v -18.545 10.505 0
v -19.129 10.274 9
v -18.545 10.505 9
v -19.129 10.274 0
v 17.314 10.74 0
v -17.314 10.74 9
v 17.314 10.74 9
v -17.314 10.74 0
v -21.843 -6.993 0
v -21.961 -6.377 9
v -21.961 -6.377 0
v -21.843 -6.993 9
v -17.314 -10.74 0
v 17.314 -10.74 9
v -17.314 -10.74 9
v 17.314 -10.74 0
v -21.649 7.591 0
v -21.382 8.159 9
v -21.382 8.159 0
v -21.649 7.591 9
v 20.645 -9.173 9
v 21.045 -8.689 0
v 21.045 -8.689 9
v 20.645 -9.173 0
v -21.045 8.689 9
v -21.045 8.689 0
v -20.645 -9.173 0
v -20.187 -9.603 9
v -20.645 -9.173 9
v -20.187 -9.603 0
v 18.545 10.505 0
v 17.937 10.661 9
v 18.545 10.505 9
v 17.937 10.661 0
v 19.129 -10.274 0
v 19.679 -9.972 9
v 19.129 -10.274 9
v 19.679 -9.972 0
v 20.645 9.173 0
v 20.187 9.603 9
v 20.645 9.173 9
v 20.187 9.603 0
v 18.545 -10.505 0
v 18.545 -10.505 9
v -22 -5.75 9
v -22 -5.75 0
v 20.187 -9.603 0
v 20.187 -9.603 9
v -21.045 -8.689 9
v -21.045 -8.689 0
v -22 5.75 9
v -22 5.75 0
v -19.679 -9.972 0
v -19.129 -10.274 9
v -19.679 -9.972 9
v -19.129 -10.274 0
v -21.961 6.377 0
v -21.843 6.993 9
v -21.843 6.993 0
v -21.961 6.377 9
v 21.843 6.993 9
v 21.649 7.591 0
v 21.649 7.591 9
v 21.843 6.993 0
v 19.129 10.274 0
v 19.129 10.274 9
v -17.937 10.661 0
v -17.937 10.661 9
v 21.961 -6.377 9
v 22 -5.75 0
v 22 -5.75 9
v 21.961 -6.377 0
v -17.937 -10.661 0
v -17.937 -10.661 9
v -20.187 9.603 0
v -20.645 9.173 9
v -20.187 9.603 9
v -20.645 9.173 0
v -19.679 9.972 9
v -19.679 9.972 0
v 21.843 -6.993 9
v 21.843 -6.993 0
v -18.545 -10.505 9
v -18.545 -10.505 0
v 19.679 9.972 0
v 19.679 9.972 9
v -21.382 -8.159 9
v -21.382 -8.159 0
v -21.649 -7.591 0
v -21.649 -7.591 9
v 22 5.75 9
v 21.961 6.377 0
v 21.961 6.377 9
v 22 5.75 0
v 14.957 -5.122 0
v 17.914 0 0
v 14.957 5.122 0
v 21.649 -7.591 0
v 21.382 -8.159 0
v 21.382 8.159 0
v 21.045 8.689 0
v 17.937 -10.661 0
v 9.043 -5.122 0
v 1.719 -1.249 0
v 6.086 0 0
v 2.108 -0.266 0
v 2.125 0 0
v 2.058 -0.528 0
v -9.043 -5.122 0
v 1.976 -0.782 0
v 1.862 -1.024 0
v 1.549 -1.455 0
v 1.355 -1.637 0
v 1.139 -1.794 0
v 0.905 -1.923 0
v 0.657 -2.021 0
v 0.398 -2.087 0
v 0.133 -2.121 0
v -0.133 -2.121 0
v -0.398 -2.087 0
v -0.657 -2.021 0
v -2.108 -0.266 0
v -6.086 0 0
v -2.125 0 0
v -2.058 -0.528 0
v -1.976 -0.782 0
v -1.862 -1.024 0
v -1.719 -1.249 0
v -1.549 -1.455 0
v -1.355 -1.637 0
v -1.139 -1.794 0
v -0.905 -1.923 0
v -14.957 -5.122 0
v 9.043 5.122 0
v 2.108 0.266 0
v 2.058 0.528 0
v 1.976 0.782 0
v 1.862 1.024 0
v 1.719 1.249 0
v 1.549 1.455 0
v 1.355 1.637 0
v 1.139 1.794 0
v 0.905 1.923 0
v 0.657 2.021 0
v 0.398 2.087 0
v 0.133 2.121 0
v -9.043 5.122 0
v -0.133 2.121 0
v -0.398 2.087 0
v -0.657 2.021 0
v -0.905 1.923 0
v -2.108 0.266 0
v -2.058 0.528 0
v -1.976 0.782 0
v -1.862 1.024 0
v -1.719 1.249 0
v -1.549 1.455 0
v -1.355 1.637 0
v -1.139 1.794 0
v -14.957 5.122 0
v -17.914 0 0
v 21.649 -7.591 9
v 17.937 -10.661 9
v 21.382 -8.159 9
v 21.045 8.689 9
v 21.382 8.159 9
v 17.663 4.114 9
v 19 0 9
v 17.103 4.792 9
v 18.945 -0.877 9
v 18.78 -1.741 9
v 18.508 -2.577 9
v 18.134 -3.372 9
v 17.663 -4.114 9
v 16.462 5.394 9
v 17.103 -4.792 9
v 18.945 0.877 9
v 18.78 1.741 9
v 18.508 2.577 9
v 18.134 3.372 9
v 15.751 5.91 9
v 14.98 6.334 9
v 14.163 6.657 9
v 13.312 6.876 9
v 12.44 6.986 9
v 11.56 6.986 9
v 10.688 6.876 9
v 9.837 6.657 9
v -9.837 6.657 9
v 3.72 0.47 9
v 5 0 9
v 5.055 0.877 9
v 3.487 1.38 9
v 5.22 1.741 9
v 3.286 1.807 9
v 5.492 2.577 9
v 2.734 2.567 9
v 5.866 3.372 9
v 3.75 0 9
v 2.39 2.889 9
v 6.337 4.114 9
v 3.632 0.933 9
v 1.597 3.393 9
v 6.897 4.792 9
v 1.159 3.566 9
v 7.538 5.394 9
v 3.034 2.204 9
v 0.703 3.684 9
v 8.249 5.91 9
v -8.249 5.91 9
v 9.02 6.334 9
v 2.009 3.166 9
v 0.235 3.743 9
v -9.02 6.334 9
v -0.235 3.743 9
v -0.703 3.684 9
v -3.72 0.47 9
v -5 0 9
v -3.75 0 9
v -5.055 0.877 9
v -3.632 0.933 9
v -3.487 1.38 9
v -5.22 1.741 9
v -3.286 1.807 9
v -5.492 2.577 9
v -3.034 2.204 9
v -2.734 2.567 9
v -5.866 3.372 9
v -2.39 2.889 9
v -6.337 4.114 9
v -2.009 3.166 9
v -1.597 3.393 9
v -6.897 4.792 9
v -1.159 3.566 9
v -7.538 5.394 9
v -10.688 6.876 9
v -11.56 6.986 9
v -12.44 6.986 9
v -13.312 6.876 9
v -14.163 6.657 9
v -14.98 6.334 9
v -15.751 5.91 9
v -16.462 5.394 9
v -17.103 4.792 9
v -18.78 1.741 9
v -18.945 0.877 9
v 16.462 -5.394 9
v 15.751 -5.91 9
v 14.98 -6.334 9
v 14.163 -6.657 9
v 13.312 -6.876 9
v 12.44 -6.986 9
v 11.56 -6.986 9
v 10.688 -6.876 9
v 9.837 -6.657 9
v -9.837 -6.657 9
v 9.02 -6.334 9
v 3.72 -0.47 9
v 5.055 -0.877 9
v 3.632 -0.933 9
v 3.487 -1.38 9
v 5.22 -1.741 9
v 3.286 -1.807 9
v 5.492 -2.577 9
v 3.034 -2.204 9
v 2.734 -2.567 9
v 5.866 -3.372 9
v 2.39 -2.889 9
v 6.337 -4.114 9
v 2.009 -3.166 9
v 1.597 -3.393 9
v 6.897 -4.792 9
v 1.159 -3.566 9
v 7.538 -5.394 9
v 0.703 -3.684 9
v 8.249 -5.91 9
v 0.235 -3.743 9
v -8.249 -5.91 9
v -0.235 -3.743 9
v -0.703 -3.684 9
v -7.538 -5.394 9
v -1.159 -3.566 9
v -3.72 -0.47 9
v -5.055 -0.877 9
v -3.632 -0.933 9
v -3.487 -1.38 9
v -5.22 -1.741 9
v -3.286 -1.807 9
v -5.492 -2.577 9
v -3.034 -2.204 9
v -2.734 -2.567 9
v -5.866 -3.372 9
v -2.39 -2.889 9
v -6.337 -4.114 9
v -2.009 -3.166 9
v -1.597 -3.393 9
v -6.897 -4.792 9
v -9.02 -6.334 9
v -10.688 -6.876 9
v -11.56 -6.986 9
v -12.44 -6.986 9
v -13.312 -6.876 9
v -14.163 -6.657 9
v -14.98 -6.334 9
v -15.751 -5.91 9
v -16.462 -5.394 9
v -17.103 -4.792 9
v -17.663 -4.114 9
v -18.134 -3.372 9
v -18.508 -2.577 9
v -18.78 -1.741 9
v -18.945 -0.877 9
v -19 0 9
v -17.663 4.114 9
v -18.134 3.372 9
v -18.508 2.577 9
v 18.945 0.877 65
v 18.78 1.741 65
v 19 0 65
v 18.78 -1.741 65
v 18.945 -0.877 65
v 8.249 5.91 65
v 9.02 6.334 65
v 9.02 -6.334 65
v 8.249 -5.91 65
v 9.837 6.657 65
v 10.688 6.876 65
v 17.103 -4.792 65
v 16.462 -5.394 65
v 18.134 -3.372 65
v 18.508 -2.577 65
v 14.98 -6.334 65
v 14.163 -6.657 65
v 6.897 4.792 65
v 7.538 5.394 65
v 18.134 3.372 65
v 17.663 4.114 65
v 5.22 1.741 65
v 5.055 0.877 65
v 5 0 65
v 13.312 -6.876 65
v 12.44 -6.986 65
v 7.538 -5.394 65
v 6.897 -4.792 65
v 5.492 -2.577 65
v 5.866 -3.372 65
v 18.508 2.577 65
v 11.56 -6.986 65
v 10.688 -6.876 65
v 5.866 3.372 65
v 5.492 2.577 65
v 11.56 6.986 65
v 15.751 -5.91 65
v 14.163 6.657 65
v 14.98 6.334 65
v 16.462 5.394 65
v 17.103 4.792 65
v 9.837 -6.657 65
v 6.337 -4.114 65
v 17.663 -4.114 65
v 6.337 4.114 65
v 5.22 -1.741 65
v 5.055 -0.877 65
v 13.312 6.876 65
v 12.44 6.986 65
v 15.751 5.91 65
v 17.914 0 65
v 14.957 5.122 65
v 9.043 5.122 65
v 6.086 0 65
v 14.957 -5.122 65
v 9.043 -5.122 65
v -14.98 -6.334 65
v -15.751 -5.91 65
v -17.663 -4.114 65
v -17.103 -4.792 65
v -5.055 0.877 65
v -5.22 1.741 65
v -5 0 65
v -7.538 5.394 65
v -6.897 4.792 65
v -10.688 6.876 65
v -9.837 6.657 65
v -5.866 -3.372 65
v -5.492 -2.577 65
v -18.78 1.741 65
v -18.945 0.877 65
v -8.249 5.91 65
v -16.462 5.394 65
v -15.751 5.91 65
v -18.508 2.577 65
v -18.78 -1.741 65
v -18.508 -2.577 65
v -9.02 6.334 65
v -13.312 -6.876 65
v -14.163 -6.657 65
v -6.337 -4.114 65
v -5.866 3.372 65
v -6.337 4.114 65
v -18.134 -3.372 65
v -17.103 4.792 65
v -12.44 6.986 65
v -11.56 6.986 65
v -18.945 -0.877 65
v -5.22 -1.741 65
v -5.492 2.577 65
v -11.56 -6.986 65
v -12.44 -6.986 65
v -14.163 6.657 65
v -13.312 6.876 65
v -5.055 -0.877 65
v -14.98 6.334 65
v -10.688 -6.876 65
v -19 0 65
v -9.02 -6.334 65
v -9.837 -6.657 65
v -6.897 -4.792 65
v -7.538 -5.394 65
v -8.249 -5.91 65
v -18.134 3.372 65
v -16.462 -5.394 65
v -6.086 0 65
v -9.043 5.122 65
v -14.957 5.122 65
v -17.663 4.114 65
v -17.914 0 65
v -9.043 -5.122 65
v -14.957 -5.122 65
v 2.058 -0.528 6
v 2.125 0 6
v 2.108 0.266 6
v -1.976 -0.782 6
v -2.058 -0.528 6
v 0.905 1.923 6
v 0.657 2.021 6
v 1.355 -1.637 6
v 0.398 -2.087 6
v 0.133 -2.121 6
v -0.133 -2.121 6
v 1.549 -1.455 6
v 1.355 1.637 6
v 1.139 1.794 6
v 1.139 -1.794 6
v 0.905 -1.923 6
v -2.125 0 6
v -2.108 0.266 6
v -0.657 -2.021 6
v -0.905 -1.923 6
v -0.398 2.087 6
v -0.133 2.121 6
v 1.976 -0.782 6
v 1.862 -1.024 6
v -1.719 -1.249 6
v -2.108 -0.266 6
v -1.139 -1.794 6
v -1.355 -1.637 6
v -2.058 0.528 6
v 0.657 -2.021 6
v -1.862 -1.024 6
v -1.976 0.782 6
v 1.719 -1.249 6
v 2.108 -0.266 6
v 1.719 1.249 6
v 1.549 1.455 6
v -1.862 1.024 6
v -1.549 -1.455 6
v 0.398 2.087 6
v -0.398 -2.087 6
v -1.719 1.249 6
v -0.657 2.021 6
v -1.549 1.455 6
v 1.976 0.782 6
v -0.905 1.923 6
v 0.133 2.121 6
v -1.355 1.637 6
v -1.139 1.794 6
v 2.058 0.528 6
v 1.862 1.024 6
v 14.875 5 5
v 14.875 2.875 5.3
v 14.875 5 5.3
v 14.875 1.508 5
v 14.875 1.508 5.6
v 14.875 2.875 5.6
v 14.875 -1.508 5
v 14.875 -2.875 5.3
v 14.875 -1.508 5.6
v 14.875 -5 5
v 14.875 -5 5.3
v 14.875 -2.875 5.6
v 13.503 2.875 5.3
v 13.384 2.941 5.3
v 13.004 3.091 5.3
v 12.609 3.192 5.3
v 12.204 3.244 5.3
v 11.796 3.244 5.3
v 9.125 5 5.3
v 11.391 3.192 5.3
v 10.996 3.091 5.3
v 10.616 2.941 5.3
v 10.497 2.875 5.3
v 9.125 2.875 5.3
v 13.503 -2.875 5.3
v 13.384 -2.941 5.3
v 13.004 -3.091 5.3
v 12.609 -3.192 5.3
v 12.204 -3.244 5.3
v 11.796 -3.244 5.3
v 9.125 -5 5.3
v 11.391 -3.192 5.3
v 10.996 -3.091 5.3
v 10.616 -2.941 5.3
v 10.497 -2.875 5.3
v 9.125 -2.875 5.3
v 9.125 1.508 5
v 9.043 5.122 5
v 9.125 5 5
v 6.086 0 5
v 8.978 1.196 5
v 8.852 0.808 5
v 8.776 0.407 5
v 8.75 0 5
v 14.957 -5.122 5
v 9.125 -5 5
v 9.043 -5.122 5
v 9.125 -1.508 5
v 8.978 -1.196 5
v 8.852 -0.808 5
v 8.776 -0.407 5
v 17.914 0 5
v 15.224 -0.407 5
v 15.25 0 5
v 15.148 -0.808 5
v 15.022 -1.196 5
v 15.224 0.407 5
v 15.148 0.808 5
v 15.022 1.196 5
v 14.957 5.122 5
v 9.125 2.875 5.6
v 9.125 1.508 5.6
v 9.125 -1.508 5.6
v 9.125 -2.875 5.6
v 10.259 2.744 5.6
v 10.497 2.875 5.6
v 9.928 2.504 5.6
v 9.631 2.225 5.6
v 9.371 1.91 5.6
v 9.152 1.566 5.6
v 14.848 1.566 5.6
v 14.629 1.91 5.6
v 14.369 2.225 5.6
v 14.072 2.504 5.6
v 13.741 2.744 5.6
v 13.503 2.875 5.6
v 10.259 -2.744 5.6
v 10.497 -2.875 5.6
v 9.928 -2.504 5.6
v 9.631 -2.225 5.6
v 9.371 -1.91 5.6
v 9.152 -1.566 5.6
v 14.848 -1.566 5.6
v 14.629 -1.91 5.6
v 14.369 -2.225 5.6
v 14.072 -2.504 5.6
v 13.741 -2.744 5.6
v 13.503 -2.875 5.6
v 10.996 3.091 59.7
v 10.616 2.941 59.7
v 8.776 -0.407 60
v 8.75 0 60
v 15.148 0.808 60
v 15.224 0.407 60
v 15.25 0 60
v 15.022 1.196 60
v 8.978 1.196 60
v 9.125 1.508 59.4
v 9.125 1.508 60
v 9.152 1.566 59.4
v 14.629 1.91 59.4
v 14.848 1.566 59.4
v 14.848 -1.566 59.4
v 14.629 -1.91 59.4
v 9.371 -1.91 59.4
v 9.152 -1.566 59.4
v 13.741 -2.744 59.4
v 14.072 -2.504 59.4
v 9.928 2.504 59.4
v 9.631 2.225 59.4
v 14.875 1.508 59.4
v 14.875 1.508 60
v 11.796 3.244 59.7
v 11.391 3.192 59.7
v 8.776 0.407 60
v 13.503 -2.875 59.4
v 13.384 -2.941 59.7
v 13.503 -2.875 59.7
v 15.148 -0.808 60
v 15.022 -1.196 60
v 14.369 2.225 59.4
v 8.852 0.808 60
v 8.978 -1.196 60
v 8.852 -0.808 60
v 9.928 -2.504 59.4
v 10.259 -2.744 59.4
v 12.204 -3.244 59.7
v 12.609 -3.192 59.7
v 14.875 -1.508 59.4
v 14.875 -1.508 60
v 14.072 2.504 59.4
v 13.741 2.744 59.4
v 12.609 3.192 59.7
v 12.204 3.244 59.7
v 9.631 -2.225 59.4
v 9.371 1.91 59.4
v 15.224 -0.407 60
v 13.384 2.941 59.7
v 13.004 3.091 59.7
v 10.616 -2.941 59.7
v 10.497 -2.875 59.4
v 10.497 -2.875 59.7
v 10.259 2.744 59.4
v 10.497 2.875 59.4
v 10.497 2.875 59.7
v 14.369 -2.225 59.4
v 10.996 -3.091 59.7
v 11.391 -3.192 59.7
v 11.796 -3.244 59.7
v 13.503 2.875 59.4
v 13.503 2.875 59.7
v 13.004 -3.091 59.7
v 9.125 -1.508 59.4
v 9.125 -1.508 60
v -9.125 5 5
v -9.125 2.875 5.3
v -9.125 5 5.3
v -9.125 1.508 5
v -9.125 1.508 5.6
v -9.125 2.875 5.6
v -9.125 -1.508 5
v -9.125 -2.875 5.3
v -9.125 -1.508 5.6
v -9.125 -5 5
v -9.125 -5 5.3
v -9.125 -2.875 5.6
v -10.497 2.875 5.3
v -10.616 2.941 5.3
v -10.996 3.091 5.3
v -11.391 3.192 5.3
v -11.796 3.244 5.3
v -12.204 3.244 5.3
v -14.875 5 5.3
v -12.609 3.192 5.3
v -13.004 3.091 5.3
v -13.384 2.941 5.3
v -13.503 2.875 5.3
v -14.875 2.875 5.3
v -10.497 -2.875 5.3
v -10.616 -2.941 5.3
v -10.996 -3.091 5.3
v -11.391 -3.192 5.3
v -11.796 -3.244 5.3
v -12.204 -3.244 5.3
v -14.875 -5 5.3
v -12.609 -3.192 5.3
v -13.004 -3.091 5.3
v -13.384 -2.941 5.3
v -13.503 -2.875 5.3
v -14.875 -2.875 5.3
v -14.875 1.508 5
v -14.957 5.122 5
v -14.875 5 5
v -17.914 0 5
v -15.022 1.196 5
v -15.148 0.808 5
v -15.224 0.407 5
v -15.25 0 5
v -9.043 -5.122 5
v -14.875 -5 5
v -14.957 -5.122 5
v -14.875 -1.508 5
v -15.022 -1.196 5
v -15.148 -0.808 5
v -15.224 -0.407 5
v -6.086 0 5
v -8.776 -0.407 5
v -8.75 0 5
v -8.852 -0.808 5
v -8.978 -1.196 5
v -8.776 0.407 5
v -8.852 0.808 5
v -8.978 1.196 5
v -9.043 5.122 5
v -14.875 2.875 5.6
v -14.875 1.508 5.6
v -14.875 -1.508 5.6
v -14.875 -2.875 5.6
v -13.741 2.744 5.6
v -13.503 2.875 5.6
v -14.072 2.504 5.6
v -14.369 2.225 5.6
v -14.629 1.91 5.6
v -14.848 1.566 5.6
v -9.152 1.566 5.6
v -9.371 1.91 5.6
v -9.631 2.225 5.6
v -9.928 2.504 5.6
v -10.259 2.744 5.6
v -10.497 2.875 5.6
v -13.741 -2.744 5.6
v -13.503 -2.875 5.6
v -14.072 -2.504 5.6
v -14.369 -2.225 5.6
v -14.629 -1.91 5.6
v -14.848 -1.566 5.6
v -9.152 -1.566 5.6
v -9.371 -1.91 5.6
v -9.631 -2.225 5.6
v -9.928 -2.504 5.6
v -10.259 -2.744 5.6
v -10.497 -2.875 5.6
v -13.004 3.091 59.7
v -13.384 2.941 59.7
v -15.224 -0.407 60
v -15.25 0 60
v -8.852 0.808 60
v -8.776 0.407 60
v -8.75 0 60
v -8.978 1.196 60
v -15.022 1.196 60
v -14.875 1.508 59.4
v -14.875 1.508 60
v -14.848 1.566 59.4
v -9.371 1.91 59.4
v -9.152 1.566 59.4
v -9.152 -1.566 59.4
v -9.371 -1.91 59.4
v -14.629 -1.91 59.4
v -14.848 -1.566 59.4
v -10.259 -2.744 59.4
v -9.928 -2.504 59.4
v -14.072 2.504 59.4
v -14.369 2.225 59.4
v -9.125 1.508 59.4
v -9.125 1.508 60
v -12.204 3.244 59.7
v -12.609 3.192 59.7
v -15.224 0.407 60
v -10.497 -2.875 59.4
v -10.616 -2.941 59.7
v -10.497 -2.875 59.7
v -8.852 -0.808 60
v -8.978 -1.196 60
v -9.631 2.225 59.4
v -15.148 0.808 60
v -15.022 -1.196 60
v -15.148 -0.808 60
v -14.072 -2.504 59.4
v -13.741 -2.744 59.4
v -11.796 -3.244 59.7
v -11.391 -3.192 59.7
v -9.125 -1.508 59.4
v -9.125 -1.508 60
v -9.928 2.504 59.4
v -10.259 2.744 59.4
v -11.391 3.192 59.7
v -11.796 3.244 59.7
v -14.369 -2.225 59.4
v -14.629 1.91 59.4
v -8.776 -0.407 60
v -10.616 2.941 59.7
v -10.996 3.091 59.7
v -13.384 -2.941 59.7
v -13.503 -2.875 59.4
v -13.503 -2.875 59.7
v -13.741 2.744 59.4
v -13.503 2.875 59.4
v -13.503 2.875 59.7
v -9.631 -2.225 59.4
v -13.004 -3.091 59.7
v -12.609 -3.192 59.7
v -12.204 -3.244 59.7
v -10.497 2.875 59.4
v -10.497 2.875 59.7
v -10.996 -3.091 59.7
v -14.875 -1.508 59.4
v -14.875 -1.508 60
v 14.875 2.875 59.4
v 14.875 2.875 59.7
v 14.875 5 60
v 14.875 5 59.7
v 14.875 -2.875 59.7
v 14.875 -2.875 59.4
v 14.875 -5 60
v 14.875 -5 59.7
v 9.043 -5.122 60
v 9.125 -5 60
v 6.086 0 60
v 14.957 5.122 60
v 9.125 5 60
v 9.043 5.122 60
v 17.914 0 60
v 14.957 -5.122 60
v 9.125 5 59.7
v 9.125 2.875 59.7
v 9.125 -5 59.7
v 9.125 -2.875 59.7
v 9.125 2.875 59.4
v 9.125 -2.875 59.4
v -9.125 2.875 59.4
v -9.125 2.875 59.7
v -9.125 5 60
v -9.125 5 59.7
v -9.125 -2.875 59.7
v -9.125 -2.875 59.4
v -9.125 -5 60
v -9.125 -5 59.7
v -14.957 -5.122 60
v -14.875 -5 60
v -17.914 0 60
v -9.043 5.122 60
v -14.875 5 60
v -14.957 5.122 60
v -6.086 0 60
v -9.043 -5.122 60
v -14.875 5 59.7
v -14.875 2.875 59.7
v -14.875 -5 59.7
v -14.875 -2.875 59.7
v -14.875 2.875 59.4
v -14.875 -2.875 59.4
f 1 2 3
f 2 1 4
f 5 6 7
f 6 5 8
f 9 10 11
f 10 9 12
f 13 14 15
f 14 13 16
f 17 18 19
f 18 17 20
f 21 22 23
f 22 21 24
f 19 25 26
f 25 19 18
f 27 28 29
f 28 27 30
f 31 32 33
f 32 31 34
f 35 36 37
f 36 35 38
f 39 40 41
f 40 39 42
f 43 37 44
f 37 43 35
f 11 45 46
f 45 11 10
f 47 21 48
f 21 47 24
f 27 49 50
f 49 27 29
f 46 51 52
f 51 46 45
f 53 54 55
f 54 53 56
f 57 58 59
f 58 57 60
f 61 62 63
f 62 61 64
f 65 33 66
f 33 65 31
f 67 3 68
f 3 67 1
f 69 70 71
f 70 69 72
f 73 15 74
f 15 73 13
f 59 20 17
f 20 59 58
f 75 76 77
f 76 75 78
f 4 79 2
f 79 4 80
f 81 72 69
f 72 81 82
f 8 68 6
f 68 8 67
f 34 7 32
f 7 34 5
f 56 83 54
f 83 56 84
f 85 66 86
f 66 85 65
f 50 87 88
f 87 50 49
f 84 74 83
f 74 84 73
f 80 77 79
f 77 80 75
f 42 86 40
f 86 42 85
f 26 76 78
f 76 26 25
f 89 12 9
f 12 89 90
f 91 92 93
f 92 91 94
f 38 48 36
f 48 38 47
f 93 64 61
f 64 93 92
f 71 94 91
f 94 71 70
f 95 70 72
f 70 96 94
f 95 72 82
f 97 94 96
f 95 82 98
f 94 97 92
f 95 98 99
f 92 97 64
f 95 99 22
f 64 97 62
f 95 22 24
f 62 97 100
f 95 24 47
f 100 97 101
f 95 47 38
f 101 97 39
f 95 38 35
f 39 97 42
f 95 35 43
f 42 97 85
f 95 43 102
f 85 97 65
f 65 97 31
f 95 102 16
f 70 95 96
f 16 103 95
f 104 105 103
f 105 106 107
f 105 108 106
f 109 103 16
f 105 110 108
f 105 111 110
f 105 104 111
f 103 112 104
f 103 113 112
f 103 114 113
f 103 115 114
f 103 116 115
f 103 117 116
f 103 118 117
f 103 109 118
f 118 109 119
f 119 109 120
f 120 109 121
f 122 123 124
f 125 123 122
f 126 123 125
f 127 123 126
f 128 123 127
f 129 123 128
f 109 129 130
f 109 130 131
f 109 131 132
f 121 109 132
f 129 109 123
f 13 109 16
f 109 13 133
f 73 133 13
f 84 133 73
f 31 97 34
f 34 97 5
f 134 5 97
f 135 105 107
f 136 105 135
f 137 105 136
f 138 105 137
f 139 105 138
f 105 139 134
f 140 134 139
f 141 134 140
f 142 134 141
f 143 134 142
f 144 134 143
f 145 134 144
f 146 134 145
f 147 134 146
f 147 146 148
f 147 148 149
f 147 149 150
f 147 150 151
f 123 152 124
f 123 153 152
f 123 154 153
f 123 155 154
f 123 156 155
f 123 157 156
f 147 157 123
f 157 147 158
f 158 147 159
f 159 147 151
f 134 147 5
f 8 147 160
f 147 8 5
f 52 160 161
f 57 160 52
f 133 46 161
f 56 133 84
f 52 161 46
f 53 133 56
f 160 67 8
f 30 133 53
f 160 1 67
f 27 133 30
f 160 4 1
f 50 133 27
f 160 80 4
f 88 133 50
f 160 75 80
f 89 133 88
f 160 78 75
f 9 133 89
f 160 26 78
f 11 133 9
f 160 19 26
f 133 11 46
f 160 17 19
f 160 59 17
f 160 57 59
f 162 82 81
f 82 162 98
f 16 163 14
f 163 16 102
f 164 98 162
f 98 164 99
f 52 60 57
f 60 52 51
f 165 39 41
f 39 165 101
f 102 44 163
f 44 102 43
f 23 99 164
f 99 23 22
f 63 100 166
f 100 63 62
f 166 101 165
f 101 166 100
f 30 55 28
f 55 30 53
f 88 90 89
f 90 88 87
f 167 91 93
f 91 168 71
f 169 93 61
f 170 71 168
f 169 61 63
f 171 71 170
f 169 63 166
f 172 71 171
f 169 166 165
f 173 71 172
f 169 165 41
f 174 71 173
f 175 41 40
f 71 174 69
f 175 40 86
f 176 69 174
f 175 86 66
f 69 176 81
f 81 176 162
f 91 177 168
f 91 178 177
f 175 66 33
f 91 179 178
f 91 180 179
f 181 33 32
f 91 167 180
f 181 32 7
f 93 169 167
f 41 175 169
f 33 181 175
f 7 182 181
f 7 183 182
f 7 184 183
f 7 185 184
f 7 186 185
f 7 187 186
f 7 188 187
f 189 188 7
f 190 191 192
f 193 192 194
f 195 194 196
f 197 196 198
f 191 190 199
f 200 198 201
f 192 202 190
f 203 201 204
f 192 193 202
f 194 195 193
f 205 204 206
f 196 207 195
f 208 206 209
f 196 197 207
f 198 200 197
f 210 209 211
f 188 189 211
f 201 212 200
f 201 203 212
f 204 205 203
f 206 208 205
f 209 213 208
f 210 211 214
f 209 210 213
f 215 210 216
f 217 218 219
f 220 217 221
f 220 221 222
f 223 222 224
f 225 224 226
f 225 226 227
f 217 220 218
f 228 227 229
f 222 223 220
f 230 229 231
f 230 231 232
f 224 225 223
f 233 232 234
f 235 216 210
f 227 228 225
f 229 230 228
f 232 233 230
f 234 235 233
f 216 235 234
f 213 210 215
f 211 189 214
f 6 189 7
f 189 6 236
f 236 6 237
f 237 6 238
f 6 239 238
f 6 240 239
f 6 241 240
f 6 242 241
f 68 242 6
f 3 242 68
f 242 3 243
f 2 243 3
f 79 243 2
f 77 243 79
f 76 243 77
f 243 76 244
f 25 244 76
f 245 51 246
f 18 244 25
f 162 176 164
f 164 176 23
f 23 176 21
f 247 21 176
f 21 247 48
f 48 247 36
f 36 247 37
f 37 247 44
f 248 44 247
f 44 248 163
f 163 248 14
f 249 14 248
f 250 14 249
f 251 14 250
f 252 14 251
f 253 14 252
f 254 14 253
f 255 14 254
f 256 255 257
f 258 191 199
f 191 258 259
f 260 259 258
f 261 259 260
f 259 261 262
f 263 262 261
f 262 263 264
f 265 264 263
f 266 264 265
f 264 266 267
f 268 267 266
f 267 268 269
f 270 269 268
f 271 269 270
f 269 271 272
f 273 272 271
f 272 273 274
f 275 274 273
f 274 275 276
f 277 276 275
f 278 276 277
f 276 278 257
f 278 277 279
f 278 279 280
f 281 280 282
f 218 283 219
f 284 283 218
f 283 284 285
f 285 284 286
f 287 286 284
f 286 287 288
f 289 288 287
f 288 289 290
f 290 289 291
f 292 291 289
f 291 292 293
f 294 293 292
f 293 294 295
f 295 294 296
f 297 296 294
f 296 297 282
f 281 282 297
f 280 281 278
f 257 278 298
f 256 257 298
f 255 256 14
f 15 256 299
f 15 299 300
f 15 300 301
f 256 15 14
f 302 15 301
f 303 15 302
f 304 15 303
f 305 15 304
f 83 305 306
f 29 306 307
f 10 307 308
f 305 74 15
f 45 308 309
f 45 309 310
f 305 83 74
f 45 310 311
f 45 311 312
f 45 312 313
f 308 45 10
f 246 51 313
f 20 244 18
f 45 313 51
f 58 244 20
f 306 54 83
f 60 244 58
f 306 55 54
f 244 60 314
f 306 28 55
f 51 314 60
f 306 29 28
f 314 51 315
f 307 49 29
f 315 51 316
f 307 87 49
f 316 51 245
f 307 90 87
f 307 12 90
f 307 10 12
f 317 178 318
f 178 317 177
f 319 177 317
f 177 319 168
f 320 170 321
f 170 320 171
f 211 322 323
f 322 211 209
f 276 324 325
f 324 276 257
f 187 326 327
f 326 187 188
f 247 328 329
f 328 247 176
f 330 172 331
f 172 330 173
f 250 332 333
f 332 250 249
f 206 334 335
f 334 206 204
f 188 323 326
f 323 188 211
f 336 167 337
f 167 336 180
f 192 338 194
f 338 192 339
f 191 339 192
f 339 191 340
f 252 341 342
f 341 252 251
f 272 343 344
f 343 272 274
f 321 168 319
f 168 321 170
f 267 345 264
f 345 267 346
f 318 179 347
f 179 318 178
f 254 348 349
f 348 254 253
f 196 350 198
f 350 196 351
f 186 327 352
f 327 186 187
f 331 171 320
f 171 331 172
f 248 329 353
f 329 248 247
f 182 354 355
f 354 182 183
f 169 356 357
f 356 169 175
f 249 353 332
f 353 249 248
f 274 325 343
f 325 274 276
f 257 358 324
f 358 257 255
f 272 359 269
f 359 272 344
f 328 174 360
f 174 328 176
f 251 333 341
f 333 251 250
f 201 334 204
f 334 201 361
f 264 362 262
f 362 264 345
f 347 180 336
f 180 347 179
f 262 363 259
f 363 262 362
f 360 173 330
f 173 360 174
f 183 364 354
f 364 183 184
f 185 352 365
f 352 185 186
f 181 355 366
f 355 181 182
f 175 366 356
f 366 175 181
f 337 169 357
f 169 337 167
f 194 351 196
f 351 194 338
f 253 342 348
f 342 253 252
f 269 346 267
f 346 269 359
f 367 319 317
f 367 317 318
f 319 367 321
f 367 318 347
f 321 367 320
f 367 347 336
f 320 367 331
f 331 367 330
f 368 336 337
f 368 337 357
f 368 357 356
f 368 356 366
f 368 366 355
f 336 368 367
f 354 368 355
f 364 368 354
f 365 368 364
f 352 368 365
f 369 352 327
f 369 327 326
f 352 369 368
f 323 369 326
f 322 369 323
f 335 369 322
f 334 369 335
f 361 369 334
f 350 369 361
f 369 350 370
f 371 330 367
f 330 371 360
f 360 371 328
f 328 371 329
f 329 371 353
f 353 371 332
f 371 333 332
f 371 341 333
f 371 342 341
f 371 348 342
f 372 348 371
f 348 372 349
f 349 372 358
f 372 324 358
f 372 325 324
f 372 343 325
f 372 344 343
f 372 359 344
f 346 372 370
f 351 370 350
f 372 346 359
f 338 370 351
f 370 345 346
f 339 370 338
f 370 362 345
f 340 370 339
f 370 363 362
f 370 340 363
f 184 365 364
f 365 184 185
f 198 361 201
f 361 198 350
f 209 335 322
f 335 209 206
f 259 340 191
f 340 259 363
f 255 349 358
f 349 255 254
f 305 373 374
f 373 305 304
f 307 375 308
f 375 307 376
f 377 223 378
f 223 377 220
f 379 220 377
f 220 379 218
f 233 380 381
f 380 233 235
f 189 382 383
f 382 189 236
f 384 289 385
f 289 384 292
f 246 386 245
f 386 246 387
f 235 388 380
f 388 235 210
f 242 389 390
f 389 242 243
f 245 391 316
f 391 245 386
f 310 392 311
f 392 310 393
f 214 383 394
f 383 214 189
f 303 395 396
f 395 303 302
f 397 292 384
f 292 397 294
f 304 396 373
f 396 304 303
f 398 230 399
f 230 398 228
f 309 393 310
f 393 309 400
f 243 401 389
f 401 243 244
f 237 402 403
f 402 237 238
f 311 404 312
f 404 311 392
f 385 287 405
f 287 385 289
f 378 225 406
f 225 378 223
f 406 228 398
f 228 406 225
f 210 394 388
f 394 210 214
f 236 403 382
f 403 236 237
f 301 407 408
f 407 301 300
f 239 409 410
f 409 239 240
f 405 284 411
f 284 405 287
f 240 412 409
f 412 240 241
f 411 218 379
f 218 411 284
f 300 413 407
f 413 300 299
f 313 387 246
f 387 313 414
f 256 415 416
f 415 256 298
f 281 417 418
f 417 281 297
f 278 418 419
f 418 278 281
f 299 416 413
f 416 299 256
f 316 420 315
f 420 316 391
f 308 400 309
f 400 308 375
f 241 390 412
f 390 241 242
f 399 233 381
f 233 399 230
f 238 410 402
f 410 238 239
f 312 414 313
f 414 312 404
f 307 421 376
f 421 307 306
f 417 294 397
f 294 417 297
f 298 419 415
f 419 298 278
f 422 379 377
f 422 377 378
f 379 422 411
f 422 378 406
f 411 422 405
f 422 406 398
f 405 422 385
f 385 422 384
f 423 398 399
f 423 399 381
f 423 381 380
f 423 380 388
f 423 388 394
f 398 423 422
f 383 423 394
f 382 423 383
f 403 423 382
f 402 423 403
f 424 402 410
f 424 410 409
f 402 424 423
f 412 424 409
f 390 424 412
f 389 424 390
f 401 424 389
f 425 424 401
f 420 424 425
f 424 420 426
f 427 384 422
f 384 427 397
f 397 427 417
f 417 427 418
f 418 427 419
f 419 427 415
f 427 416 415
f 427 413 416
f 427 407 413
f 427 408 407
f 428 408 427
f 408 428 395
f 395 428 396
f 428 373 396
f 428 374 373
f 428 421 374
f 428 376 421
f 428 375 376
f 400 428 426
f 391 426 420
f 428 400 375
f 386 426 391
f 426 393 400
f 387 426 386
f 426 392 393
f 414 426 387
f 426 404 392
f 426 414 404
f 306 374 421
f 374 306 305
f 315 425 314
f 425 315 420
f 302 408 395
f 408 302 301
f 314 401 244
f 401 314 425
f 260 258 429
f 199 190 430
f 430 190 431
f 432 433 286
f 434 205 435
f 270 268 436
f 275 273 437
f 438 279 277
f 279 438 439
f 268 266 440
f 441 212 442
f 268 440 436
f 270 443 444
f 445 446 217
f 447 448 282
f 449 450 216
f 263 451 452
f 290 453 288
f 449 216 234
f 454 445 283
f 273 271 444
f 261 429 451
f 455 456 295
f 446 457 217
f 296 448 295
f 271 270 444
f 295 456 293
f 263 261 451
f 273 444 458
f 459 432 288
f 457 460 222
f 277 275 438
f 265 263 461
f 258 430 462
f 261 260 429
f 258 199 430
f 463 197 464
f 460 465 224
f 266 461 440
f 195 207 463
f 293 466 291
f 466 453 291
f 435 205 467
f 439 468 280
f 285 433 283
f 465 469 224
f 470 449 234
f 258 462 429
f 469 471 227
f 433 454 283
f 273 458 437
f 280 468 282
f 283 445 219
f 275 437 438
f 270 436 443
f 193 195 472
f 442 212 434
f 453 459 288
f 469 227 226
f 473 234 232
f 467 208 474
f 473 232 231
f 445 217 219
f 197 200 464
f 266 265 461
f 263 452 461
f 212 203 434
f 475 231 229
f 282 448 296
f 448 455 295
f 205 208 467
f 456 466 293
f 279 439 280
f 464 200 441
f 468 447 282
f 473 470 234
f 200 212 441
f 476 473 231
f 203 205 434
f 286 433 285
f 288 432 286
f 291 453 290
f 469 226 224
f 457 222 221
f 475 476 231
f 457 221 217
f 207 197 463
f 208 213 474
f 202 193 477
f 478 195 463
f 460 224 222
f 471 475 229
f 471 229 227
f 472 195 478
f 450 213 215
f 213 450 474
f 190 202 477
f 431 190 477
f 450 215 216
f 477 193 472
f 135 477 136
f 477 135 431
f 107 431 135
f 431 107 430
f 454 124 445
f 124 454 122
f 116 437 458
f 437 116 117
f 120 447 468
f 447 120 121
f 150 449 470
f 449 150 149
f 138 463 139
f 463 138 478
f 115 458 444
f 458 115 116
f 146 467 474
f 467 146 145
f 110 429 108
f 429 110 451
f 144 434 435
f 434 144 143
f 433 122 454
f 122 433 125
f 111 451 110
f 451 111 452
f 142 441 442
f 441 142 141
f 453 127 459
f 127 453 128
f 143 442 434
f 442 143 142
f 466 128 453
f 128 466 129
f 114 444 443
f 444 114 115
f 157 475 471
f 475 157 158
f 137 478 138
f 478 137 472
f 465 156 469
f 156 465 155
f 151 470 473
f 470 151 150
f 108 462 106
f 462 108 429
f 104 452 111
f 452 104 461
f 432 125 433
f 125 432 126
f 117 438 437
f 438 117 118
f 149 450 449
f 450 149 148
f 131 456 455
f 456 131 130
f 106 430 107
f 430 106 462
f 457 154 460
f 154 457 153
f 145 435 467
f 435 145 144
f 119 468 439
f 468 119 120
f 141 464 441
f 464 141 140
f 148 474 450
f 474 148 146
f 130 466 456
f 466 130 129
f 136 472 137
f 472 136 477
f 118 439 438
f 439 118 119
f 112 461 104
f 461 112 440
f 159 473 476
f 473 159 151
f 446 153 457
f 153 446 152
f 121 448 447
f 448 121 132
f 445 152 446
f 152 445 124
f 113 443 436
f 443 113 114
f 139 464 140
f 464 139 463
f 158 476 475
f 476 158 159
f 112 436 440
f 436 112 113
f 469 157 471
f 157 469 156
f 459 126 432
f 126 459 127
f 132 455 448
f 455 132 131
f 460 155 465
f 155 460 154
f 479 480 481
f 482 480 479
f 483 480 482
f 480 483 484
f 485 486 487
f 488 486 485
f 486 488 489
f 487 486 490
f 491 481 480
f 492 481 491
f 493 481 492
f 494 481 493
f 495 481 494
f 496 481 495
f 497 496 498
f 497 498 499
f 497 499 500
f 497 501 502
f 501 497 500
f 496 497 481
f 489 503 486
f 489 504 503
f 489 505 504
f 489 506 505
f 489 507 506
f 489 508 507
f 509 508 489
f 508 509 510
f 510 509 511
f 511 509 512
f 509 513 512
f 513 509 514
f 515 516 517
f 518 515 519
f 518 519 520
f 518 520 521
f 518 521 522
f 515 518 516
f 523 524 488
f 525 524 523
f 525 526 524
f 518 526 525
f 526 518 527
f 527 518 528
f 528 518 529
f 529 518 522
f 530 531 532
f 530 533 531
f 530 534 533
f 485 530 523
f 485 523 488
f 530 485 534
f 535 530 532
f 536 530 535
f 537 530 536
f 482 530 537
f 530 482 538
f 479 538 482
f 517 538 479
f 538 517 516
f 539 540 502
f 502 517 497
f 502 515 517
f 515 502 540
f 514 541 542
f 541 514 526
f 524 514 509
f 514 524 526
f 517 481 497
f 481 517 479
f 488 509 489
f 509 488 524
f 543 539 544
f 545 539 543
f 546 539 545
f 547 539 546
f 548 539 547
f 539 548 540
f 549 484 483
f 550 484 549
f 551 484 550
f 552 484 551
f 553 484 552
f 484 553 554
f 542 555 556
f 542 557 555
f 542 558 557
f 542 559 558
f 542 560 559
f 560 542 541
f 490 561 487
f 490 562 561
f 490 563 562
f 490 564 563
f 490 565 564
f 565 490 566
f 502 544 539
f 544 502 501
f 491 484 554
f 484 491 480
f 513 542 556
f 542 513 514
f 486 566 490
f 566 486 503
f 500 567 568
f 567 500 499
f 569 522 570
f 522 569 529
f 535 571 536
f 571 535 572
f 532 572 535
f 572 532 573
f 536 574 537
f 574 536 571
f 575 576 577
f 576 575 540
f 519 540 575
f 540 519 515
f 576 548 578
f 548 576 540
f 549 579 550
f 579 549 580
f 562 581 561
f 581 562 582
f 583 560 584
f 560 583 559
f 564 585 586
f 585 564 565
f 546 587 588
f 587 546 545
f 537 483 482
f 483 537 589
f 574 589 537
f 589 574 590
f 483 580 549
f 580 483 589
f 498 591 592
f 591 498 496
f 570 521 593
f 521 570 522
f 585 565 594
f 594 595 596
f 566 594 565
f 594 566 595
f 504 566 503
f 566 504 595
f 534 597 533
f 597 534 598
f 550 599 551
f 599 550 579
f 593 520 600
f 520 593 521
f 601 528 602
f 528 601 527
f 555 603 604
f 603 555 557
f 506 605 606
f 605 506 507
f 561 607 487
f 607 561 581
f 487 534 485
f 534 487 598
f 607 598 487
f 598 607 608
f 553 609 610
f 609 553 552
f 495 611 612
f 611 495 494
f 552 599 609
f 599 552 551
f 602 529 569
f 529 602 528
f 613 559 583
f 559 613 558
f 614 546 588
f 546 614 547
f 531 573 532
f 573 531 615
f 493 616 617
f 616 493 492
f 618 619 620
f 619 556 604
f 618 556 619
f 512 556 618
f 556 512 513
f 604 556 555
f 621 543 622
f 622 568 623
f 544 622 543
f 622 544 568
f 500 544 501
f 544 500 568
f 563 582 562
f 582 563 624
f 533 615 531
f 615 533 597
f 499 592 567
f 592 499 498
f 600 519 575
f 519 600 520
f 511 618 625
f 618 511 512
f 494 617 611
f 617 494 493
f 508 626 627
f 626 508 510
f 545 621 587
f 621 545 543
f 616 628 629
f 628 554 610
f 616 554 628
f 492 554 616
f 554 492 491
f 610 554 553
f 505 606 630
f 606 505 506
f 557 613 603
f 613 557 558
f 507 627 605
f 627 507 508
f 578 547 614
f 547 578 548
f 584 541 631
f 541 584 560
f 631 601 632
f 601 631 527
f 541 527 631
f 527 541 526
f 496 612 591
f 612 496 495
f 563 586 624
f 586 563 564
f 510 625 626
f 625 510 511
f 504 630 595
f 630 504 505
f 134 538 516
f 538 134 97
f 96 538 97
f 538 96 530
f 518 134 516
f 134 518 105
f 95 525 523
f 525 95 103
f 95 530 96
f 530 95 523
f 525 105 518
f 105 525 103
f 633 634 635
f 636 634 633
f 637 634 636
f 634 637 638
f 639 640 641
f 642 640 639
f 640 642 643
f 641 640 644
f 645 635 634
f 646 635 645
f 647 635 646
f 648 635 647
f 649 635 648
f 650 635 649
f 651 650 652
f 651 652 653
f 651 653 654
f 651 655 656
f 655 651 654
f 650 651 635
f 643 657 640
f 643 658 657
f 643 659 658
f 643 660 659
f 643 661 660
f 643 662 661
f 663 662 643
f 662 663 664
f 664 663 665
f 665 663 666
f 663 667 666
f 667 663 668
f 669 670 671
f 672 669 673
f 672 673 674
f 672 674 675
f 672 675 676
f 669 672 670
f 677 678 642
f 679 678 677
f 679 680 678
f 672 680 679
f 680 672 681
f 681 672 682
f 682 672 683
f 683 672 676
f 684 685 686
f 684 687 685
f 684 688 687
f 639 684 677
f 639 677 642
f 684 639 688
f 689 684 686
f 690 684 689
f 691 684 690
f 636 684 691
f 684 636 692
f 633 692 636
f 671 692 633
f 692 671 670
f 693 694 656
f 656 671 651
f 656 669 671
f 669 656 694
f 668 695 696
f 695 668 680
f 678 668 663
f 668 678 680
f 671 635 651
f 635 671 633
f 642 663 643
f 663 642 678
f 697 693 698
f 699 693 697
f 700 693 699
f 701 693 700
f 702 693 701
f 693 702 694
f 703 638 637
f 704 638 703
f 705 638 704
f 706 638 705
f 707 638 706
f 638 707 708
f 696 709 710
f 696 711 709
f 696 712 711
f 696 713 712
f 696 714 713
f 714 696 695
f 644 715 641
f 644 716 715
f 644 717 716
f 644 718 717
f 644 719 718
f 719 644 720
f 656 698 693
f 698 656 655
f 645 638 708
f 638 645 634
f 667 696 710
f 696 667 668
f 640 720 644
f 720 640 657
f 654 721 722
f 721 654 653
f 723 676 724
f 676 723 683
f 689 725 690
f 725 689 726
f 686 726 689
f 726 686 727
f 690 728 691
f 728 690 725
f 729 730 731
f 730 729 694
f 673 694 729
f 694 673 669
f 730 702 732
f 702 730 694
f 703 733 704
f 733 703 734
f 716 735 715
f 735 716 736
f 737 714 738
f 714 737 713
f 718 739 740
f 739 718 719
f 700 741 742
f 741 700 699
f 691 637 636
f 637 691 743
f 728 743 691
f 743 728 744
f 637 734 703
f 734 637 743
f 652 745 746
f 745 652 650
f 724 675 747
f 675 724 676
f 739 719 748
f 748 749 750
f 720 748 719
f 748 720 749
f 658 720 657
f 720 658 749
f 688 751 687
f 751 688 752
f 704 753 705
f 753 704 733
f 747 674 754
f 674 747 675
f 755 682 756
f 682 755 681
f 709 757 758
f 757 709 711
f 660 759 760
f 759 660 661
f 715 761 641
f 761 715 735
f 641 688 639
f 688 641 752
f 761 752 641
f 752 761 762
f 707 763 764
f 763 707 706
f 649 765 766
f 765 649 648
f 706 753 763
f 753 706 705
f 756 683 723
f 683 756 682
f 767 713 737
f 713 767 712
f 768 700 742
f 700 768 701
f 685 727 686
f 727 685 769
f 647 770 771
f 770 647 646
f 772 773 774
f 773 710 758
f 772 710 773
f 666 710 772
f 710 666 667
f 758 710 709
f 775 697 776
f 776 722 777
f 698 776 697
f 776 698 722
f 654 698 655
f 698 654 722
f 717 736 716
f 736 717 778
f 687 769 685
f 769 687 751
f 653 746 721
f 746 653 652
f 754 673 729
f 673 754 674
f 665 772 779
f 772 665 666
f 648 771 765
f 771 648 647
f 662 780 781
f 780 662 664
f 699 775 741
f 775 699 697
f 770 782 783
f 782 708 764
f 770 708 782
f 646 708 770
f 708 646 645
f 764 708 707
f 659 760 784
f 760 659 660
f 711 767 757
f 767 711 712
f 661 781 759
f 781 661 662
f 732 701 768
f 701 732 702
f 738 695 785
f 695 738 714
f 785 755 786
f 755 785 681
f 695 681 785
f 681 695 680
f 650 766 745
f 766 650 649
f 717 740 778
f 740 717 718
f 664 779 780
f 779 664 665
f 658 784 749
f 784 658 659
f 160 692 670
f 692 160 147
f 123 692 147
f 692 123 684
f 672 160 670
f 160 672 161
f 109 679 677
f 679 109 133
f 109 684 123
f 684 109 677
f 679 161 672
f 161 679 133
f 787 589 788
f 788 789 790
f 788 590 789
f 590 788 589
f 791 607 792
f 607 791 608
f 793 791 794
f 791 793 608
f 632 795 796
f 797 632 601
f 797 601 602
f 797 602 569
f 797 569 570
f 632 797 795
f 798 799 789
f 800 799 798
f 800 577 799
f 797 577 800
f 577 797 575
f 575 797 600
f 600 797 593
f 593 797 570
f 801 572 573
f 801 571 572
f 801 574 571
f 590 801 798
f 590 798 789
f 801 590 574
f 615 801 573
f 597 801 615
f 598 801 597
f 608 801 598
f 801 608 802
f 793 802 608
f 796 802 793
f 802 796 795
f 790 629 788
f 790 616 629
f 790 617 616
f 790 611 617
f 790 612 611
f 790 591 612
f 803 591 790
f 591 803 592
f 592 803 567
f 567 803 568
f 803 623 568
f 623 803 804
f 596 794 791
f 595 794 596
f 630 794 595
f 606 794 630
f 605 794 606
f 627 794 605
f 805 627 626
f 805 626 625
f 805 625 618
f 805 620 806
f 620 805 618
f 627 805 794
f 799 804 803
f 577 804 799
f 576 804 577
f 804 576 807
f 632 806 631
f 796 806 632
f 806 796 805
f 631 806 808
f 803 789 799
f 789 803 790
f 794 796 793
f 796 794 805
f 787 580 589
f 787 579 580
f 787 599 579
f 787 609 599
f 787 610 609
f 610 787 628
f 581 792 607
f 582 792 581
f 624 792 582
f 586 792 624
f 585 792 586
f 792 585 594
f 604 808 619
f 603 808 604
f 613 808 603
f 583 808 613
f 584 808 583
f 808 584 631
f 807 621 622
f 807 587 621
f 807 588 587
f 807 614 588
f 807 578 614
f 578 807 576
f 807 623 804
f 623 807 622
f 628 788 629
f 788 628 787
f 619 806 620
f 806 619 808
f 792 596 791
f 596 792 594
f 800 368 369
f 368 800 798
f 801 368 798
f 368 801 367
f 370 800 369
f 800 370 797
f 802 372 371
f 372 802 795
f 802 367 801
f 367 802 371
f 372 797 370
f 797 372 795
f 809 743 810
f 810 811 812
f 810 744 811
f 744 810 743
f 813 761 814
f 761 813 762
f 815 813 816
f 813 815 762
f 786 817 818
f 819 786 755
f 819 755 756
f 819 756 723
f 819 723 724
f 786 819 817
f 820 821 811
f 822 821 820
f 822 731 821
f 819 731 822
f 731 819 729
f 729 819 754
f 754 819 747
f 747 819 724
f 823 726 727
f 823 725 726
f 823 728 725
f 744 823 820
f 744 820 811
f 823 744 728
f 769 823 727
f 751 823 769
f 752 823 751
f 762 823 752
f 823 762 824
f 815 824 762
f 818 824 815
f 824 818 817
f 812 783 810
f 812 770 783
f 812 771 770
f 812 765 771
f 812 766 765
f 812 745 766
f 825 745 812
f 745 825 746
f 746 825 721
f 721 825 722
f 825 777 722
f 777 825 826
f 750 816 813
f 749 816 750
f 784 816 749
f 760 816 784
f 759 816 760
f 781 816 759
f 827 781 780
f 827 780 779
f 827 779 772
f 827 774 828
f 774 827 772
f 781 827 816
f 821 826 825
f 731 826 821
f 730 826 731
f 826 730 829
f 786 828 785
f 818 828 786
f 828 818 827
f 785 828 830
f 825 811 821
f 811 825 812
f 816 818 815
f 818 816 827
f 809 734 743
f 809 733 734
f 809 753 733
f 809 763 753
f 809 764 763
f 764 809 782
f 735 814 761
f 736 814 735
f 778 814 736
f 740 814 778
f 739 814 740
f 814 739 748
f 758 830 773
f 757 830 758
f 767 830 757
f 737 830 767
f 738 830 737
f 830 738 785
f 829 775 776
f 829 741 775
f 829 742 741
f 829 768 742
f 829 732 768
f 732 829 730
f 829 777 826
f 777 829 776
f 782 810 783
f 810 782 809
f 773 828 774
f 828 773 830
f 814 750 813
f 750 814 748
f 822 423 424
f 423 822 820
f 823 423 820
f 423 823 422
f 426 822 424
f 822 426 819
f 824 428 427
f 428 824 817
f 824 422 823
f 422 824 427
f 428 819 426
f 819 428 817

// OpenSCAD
$fn = 50;


difference() {
	union() {
		hull() {
			translate(v = [-17.0000000000, 5.7500000000, 0]) {
				cylinder(h = 9, r = 5);
			}
			translate(v = [17.0000000000, 5.7500000000, 0]) {
				cylinder(h = 9, r = 5);
			}
			translate(v = [-17.0000000000, -5.7500000000, 0]) {
				cylinder(h = 9, r = 5);
			}
			translate(v = [17.0000000000, -5.7500000000, 0]) {
				cylinder(h = 9, r = 5);
			}
		}
		translate(v = [12.0000000000, 0, 0.0000000000]) {
			cylinder(h = 65, r = 7.0000000000);
		}
		translate(v = [-12.0000000000, 0, 0.0000000000]) {
			cylinder(h = 65, r = 7.0000000000);
		}
	}
	union() {
		translate(v = [0, 0, 9]) {
			rotate(a = [0, 0, 0]) {
				difference() {
					union() {
						#translate(v = [0, 0, -60.0000000000]) {
							cylinder(h = 60, r = 2.0000000000);
						}
						#translate(v = [0, 0, -3]) {
							cylinder(h = 3, r1 = 2.1250000000, r2 = 3.7500000000);
						}
						#translate(v = [0, 0, -60.0000000000]) {
							cylinder(h = 60, r = 2.1250000000);
						}
						#translate(v = [0, 0, -60.0000000000]) {
							cylinder(h = 60, r = 2.0000000000);
						}
					}
					union();
				}
			}
		}
		translate(v = [12.0000000000, 0, 0]) {
			rotate(a = [0, 0, 0]) {
				difference() {
					union() {
						#translate(v = [-2.8750000000, -5.0000000000, -0.3000000000]) {
							cube(size = [5.7500000000, 10, 0.3000000000]);
						}
						#translate(v = [-2.8750000000, -2.8750000000, -0.6000000000]) {
							cube(size = [5.7500000000, 5.7500000000, 0.3000000000]);
						}
						#translate(v = [-2.8750000000, -5.0000000000, 5]) {
							cube(size = [5.7500000000, 10, 0.3000000000]);
						}
						#translate(v = [-2.8750000000, -2.8750000000, 5.3000000000]) {
							cube(size = [5.7500000000, 5.7500000000, 0.3000000000]);
						}
						#translate(v = [0, 0, -100.0000000000]) {
							cylinder(h = 200, r = 3.2500000000);
						}
						#linear_extrude(height = 5) {
							polygon(points = [[5.9142500000, 0.0000000000], [2.9571250000, 5.1218907443], [-2.9571250000, 5.1218907443], [-5.9142500000, 0.0000000000], [-2.9571250000, -5.1218907443], [2.9571250000, -5.1218907443]]);
						}
						#translate(v = [-2.8750000000, -5.0000000000, -0.3000000000]) {
							cube(size = [5.7500000000, 10, 0.3000000000]);
						}
						#translate(v = [-2.8750000000, -2.8750000000, -0.6000000000]) {
							cube(size = [5.7500000000, 5.7500000000, 0.3000000000]);
						}
						#translate(v = [-2.8750000000, -5.0000000000, 5]) {
							cube(size = [5.7500000000, 10, 0.3000000000]);
						}
						#translate(v = [-2.8750000000, -2.8750000000, 5.3000000000]) {
							cube(size = [5.7500000000, 5.7500000000, 0.3000000000]);
						}
						#translate(v = [0, 0, -100.0000000000]) {
							cylinder(h = 200, r = 3.2500000000);
						}
						#translate(v = [-2.8750000000, -5.0000000000, -0.3000000000]) {
							cube(size = [5.7500000000, 10, 0.3000000000]);
						}
						#translate(v = [-2.8750000000, -2.8750000000, -0.6000000000]) {
							cube(size = [5.7500000000, 5.7500000000, 0.3000000000]);
						}
						#translate(v = [-2.8750000000, -5.0000000000, 5]) {
							cube(size = [5.7500000000, 10, 0.3000000000]);
						}
						#translate(v = [-2.8750000000, -2.8750000000, 5.3000000000]) {
							cube(size = [5.7500000000, 5.7500000000, 0.3000000000]);
						}
						#translate(v = [0, 0, -100.0000000000]) {
							cylinder(h = 200, r = 3.2500000000);
						}
					}
					union();
				}
			}
		}
		translate(v = [-12.0000000000, 0, 0]) {
			rotate(a = [0, 0, 0]) {
				difference() {
					union() {
						#translate(v = [-2.8750000000, -5.0000000000, -0.3000000000]) {
							cube(size = [5.7500000000, 10, 0.3000000000]);
						}
						#translate(v = [-2.8750000000, -2.8750000000, -0.6000000000]) {
							cube(size = [5.7500000000, 5.7500000000, 0.3000000000]);
						}
						#translate(v = [-2.8750000000, -5.0000000000, 5]) {
							cube(size = [5.7500000000, 10, 0.3000000000]);
						}
						#translate(v = [-2.8750000000, -2.8750000000, 5.3000000000]) {
							cube(size = [5.7500000000, 5.7500000000, 0.3000000000]);
						}
						#translate(v = [0, 0, -100.0000000000]) {
							cylinder(h = 200, r = 3.2500000000);
						}
						#linear_extrude(height = 5) {
							polygon(points = [[5.9142500000, 0.0000000000], [2.9571250000, 5.1218907443], [-2.9571250000, 5.1218907443], [-5.9142500000, 0.0000000000], [-2.9571250000, -5.1218907443], [2.9571250000, -5.1218907443]]);
						}
						#translate(v = [-2.8750000000, -5.0000000000, -0.3000000000]) {
							cube(size = [5.7500000000, 10, 0.3000000000]);
						}
						#translate(v = [-2.8750000000, -2.8750000000, -0.6000000000]) {
							cube(size = [5.7500000000, 5.7500000000, 0.3000000000]);
						}
						#translate(v = [-2.8750000000, -5.0000000000, 5]) {
							cube(size = [5.7500000000, 10, 0.3000000000]);
						}
						#translate(v = [-2.8750000000, -2.8750000000, 5.3000000000]) {
							cube(size = [5.7500000000, 5.7500000000, 0.3000000000]);
						}
						#translate(v = [0, 0, -100.0000000000]) {
							cylinder(h = 200, r = 3.2500000000);
						}
						#translate(v = [-2.8750000000, -5.0000000000, -0.3000000000]) {
							cube(size = [5.7500000000, 10, 0.3000000000]);
						}
						#translate(v = [-2.8750000000, -2.8750000000, -0.6000000000]) {
							cube(size = [5.7500000000, 5.7500000000, 0.3000000000]);
						}
						#translate(v = [-2.8750000000, -5.0000000000, 5]) {
							cube(size = [5.7500000000, 10, 0.3000000000]);
						}
						#translate(v = [-2.8750000000, -2.8750000000, 5.3000000000]) {
							cube(size = [5.7500000000, 5.7500000000, 0.3000000000]);
						}
						#translate(v = [0, 0, -100.0000000000]) {
							cylinder(h = 200, r = 3.2500000000);
						}
					}
					union();
				}
			}
		}
		translate(v = [12.0000000000, 0, 65]) {
			rotate(a = [0, 0, 0]) {
				difference() {
					union() {
						#translate(v = [-2.8750000000, -5.0000000000, -5.3000000000]) {
							cube(size = [5.7500000000, 10, 0.3000000000]);
						}
						#translate(v = [-2.8750000000, -2.8750000000, -5.6000000000]) {
							cube(size = [5.7500000000, 5.7500000000, 0.3000000000]);
						}
						#translate(v = [-2.8750000000, -5.0000000000, 0]) {
							cube(size = [5.7500000000, 10, 0.3000000000]);
						}
						#translate(v = [-2.8750000000, -2.8750000000, 0.3000000000]) {
							cube(size = [5.7500000000, 5.7500000000, 0.3000000000]);
						}
						#translate(v = [0, 0, -100.0000000000]) {
							cylinder(h = 200, r = 3.2500000000);
						}
						translate(v = [0, 0, -5]) {
							#linear_extrude(height = 5) {
								polygon(points = [[5.9142500000, 0.0000000000], [2.9571250000, 5.1218907443], [-2.9571250000, 5.1218907443], [-5.9142500000, 0.0000000000], [-2.9571250000, -5.1218907443], [2.9571250000, -5.1218907443]]);
							}
						}
						#translate(v = [-2.8750000000, -5.0000000000, -5.3000000000]) {
							cube(size = [5.7500000000, 10, 0.3000000000]);
						}
						#translate(v = [-2.8750000000, -2.8750000000, -5.6000000000]) {
							cube(size = [5.7500000000, 5.7500000000, 0.3000000000]);
						}
						#translate(v = [-2.8750000000, -5.0000000000, 0]) {
							cube(size = [5.7500000000, 10, 0.3000000000]);
						}
						#translate(v = [-2.8750000000, -2.8750000000, 0.3000000000]) {
							cube(size = [5.7500000000, 5.7500000000, 0.3000000000]);
						}
						#translate(v = [0, 0, -100.0000000000]) {
							cylinder(h = 200, r = 3.2500000000);
						}
						#translate(v = [-2.8750000000, -5.0000000000, -5.3000000000]) {
							cube(size = [5.7500000000, 10, 0.3000000000]);
						}
						#translate(v = [-2.8750000000, -2.8750000000, -5.6000000000]) {
							cube(size = [5.7500000000, 5.7500000000, 0.3000000000]);
						}
						#translate(v = [-2.8750000000, -5.0000000000, 0]) {
							cube(size = [5.7500000000, 10, 0.3000000000]);
						}
						#translate(v = [-2.8750000000, -2.8750000000, 0.3000000000]) {
							cube(size = [5.7500000000, 5.7500000000, 0.3000000000]);
						}
						#translate(v = [0, 0, -100.0000000000]) {
							cylinder(h = 200, r = 3.2500000000);
						}
					}
					union();
				}
			}
		}
		translate(v = [-12.0000000000, 0, 65]) {
			rotate(a = [0, 0, 0]) {
				difference() {
					union() {
						#translate(v = [-2.8750000000, -5.0000000000, -5.3000000000]) {
							cube(size = [5.7500000000, 10, 0.3000000000]);
						}
						#translate(v = [-2.8750000000, -2.8750000000, -5.6000000000]) {
							cube(size = [5.7500000000, 5.7500000000, 0.3000000000]);
						}
						#translate(v = [-2.8750000000, -5.0000000000, 0]) {
							cube(size = [5.7500000000, 10, 0.3000000000]);
						}
						#translate(v = [-2.8750000000, -2.8750000000, 0.3000000000]) {
							cube(size = [5.7500000000, 5.7500000000, 0.3000000000]);
						}
						#translate(v = [0, 0, -100.0000000000]) {
							cylinder(h = 200, r = 3.2500000000);
						}
						translate(v = [0, 0, -5]) {
							#linear_extrude(height = 5) {
								polygon(points = [[5.9142500000, 0.0000000000], [2.9571250000, 5.1218907443], [-2.9571250000, 5.1218907443], [-5.9142500000, 0.0000000000], [-2.9571250000, -5.1218907443], [2.9571250000, -5.1218907443]]);
							}
						}
						#translate(v = [-2.8750000000, -5.0000000000, -5.3000000000]) {
							cube(size = [5.7500000000, 10, 0.3000000000]);
						}
						#translate(v = [-2.8750000000, -2.8750000000, -5.6000000000]) {
							cube(size = [5.7500000000, 5.7500000000, 0.3000000000]);
						}
						#translate(v = [-2.8750000000, -5.0000000000, 0]) {
							cube(size = [5.7500000000, 10, 0.3000000000]);
						}
						#translate(v = [-2.8750000000, -2.8750000000, 0.3000000000]) {
							cube(size = [5.7500000000, 5.7500000000, 0.3000000000]);
						}
						#translate(v = [0, 0, -100.0000000000]) {
							cylinder(h = 200, r = 3.2500000000);
						}
						#translate(v = [-2.8750000000, -5.0000000000, -5.3000000000]) {
							cube(size = [5.7500000000, 10, 0.3000000000]);
						}
						#translate(v = [-2.8750000000, -2.8750000000, -5.6000000000]) {
							cube(size = [5.7500000000, 5.7500000000, 0.3000000000]);
						}
						#translate(v = [-2.8750000000, -5.0000000000, 0]) {
							cube(size = [5.7500000000, 10, 0.3000000000]);
						}
						#translate(v = [-2.8750000000, -2.8750000000, 0.3000000000]) {
							cube(size = [5.7500000000, 5.7500000000, 0.3000000000]);
						}
						#translate(v = [0, 0, -100.0000000000]) {
							cylinder(h = 200, r = 3.2500000000);
						}
					}
					union();
				}
			}
		}
	}
}
